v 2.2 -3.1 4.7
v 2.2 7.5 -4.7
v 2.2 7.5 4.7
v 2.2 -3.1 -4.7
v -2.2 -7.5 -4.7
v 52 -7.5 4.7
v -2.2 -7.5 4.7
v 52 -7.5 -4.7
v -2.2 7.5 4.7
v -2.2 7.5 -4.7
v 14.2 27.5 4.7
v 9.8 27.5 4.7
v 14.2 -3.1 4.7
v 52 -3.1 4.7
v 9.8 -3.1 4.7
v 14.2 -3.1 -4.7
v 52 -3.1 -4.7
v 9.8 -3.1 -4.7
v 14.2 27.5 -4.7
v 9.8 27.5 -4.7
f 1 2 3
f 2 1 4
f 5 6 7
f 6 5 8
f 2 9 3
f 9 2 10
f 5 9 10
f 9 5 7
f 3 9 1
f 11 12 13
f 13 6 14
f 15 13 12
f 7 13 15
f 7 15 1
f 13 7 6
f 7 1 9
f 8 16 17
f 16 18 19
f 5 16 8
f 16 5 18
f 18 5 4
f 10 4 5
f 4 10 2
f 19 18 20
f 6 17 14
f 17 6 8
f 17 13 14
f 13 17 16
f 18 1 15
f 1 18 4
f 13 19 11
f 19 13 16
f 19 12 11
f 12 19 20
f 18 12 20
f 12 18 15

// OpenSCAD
width = 9.4;
depth = 4.4;

rotate([90, 0, 0]) union() {
cube([depth, width, 15], center=true);
translate([27., 0, 5.3]) cube([50, width, depth], center=true);
translate([12, 0, -10]) cube([depth, width, 35], center=true);
};
